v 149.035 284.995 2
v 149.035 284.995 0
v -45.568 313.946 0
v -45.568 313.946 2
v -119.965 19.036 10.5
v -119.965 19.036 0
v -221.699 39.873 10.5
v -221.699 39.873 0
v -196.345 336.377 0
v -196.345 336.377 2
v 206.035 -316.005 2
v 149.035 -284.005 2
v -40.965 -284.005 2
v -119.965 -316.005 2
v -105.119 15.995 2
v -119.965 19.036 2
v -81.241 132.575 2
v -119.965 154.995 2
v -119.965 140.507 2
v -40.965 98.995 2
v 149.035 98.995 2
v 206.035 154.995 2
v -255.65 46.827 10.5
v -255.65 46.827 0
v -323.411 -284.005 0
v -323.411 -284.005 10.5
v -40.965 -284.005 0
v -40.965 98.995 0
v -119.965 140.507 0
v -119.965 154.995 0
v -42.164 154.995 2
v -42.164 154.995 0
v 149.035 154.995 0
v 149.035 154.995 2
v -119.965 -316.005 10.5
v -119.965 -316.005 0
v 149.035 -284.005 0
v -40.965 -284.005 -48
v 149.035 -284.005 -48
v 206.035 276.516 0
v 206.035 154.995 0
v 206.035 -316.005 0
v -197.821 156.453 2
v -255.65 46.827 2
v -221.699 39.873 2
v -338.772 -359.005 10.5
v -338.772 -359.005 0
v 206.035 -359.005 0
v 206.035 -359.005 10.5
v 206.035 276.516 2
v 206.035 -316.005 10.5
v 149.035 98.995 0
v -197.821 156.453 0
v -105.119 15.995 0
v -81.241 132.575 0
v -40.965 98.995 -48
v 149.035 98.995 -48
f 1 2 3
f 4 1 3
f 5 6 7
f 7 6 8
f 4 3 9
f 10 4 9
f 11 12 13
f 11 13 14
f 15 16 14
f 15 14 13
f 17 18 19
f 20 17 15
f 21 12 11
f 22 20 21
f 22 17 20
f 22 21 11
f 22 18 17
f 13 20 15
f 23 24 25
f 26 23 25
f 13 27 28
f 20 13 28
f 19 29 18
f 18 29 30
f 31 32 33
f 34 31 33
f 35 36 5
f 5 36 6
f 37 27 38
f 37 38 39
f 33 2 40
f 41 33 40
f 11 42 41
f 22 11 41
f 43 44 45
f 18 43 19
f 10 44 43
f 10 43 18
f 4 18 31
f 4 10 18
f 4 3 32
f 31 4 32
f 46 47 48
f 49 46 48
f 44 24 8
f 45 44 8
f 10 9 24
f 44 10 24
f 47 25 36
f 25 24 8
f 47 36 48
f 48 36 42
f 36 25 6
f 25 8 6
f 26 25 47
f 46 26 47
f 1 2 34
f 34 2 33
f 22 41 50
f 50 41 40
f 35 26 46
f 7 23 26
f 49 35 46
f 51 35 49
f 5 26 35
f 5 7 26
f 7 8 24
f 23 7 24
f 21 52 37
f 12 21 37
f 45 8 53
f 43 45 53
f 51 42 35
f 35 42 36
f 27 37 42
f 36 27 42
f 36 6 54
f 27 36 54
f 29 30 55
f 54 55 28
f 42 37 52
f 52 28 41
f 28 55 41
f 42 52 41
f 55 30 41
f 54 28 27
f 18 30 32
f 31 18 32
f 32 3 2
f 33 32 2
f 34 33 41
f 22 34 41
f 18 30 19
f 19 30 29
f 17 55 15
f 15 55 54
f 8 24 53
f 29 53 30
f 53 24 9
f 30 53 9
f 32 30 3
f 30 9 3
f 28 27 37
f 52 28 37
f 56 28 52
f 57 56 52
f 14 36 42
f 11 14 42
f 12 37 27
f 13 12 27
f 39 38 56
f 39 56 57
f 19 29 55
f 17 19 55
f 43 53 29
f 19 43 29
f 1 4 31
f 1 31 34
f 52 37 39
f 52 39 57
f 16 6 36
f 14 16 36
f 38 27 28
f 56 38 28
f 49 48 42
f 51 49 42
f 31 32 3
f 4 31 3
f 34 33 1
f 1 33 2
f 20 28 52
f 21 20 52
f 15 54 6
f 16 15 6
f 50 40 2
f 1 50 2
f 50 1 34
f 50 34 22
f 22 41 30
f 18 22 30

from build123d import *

# Parameters (mm, degrees)
F0_W     = 190
F0_H     = 383
F1_DEPTH = 48
F2_DEPTH = 2
F0_W_2   = 57
F0_H_2   = 43
F3_DEPTH = 10.5
F4_DEPTH = 2
F5_DEPTH = 2


with BuildPart() as f1:
    # F0 (on Top) → F1 (new body)
    with BuildSketch(Plane.XY):
        with Locations((54.035132, -92.504614)):
            Rectangle(F0_W, F0_H)
    extrude(amount=-F1_DEPTH)


with BuildPart() as f2:
    # F0 (on Top) → F2 (new body)
    with BuildSketch(Plane.XY):
        Polygon((149.035132, 154.995386), (-42.164093, 154.995386), (-40.964868, 98.995386), (149.035132, 98.995386), align=None)
        Polygon((-40.964868, -284.004614), (-119.964868, -284.004614), (-119.964868, -316.004614), (149.035132, -316.004614), (149.035132, -284.004614), align=None)
        Polygon((-40.964868, 98.995386), (-42.164093, 154.995386), (-119.964868, 154.995386), (-119.964868, 140.506544), (-81.241207, 132.575192), (-105.118999, 15.995386), (-119.964868, 19.036106), (-119.964868, -284.004614), (-40.964868, -284.004614), align=None)
        Polygon((206.035132, 154.995386), (149.035132, 154.995386), (149.035132, 98.995386), (149.035132, -284.004614), (149.035132, -316.004614), (206.035132, -316.004614), align=None)
    extrude(amount=F2_DEPTH)


with BuildPart() as f3:
    # F0 (on Top) → F3 (new body)
    with BuildSketch(Plane.XY):
        Polygon((-221.698804, 39.873178), (-255.649953, 46.827028), (-323.410651, -284.004614), (-119.964868, -284.004614), (-119.964868, 19.036106), align=None)
        Polygon((-119.964868, -284.004614), (-323.410651, -284.004614), (-338.772097, -359.004614), (149.035132, -359.004614), (149.035132, -316.004614), (-119.964868, -316.004614), align=None)
        with Locations((177.535132, -337.504614)):
            Rectangle(F0_W_2, F0_H_2)
    extrude(amount=F3_DEPTH)


with BuildPart() as f4:
    # F0 (on Top) → F4 (new body)
    with BuildSketch(Plane.XY):
        Polygon((149.035132, 284.995386), (-45.567979, 313.946105), (-42.164093, 154.995386), (149.035132, 154.995386), align=None)
    extrude(amount=F4_DEPTH)


with BuildPart() as f5:
    # F0 (on Top) → F5 (new body, through all)
    with BuildSketch(Plane.XY):
        Polygon((-45.567979, 313.946105), (-196.34457, 336.376839), (-255.649953, 46.827028), (-221.698804, 39.873178), (-197.821013, 156.452983), (-119.964868, 140.506544), (-119.964868, 154.995386), (-42.164093, 154.995386), align=None)
        Polygon((206.035132, 276.515609), (149.035132, 284.995386), (149.035132, 154.995386), (206.035132, 154.995386), align=None)
    extrude(amount=F5_DEPTH)


solid = Compound([f1.part, f2.part, f3.part, f4.part, f5.part])
